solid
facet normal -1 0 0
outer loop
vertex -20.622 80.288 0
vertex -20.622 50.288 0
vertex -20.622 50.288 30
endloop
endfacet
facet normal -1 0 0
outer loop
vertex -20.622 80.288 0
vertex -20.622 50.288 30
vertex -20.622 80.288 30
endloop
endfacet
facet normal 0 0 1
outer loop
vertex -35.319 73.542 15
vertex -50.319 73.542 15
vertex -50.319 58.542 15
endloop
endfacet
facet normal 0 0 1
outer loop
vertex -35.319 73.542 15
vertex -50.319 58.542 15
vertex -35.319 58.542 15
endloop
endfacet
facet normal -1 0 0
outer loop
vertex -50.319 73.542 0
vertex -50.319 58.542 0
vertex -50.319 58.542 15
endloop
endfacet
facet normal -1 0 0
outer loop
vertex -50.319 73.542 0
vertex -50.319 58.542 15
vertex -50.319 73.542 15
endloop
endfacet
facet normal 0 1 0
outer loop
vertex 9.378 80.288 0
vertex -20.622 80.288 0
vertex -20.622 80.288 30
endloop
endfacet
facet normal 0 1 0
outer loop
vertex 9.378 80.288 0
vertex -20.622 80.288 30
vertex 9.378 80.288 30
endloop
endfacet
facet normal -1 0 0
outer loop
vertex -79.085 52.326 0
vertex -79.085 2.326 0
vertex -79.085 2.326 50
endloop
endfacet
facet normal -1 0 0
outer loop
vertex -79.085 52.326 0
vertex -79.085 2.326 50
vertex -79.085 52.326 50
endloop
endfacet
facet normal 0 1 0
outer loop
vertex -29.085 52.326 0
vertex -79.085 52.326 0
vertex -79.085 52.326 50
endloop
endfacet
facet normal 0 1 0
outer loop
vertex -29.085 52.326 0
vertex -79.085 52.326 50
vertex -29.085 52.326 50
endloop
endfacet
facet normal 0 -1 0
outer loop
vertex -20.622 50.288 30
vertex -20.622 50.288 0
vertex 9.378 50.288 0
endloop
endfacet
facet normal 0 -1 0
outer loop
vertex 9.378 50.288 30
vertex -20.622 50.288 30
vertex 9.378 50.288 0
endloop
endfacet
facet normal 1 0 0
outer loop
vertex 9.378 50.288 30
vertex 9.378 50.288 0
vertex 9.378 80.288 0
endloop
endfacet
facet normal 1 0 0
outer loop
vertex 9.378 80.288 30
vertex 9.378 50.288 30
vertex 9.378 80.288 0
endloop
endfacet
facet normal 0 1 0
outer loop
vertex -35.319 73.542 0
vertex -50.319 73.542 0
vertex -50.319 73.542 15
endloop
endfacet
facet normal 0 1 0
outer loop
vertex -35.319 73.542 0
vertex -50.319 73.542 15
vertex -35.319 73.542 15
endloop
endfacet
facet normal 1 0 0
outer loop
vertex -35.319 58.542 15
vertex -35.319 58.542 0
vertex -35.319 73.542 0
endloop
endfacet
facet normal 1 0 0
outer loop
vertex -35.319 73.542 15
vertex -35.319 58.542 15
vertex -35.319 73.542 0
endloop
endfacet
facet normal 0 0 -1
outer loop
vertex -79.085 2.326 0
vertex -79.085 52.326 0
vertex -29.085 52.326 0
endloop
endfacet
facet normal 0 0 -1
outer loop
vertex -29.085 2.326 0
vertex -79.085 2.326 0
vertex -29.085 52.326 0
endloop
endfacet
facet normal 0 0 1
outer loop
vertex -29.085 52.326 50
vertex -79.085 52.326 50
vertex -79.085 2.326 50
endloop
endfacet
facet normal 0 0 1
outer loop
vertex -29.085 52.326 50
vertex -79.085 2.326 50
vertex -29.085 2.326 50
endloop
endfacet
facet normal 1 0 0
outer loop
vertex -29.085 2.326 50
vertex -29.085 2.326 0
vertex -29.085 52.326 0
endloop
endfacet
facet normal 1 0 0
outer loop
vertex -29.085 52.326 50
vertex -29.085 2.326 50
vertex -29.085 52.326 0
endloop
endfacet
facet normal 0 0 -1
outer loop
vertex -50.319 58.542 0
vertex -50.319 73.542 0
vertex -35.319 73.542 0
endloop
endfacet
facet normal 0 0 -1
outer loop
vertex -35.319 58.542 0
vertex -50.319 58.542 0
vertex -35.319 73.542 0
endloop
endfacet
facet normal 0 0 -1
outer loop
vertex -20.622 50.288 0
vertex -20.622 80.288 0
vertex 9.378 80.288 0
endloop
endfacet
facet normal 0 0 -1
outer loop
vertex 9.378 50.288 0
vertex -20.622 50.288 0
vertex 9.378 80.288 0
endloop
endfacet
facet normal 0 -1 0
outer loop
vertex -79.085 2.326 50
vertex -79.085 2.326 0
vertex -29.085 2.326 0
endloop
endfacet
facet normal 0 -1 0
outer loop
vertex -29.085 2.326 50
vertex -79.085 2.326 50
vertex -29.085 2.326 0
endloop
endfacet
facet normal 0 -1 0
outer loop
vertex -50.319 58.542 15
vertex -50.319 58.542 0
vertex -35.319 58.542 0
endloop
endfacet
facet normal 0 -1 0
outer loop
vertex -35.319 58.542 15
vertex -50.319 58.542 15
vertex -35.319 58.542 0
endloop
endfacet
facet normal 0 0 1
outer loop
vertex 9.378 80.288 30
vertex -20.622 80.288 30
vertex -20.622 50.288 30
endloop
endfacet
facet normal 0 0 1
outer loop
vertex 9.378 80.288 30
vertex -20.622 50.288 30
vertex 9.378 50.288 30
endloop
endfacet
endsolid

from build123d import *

# Parameters (mm, degrees)
F3_W     = 15
F3_H     = 15
F4_DEPTH = 15
F3_W_2   = 50
F3_H_2   = 50
F5_DEPTH = 50
F3_W_3   = 30
F3_H_3   = 30
F6_DEPTH = 30


with BuildPart() as f4:
    # F3 (on Top) → F4 (new body)
    with BuildSketch(Plane.XY):
        with Locations((-42.8186136484, 66.0421079397)):
            Rectangle(F3_W, F3_H)
    extrude(amount=F4_DEPTH)


with BuildPart() as f5:
    # F3 (on Top) → F5 (new body)
    with BuildSketch(Plane.XY):
        with Locations((-54.084739089, 27.3259932641)):
            Rectangle(F3_W_2, F3_H_2)
    extrude(amount=F5_DEPTH)


with BuildPart() as f6:
    # F3 (on Top) → F6 (new body)
    with BuildSketch(Plane.XY):
        with Locations((-5.6216021748, 65.2875288862)):
            Rectangle(F3_W_3, F3_H_3)
    extrude(amount=F6_DEPTH)


solid = Compound([f4.part, f5.part, f6.part])
